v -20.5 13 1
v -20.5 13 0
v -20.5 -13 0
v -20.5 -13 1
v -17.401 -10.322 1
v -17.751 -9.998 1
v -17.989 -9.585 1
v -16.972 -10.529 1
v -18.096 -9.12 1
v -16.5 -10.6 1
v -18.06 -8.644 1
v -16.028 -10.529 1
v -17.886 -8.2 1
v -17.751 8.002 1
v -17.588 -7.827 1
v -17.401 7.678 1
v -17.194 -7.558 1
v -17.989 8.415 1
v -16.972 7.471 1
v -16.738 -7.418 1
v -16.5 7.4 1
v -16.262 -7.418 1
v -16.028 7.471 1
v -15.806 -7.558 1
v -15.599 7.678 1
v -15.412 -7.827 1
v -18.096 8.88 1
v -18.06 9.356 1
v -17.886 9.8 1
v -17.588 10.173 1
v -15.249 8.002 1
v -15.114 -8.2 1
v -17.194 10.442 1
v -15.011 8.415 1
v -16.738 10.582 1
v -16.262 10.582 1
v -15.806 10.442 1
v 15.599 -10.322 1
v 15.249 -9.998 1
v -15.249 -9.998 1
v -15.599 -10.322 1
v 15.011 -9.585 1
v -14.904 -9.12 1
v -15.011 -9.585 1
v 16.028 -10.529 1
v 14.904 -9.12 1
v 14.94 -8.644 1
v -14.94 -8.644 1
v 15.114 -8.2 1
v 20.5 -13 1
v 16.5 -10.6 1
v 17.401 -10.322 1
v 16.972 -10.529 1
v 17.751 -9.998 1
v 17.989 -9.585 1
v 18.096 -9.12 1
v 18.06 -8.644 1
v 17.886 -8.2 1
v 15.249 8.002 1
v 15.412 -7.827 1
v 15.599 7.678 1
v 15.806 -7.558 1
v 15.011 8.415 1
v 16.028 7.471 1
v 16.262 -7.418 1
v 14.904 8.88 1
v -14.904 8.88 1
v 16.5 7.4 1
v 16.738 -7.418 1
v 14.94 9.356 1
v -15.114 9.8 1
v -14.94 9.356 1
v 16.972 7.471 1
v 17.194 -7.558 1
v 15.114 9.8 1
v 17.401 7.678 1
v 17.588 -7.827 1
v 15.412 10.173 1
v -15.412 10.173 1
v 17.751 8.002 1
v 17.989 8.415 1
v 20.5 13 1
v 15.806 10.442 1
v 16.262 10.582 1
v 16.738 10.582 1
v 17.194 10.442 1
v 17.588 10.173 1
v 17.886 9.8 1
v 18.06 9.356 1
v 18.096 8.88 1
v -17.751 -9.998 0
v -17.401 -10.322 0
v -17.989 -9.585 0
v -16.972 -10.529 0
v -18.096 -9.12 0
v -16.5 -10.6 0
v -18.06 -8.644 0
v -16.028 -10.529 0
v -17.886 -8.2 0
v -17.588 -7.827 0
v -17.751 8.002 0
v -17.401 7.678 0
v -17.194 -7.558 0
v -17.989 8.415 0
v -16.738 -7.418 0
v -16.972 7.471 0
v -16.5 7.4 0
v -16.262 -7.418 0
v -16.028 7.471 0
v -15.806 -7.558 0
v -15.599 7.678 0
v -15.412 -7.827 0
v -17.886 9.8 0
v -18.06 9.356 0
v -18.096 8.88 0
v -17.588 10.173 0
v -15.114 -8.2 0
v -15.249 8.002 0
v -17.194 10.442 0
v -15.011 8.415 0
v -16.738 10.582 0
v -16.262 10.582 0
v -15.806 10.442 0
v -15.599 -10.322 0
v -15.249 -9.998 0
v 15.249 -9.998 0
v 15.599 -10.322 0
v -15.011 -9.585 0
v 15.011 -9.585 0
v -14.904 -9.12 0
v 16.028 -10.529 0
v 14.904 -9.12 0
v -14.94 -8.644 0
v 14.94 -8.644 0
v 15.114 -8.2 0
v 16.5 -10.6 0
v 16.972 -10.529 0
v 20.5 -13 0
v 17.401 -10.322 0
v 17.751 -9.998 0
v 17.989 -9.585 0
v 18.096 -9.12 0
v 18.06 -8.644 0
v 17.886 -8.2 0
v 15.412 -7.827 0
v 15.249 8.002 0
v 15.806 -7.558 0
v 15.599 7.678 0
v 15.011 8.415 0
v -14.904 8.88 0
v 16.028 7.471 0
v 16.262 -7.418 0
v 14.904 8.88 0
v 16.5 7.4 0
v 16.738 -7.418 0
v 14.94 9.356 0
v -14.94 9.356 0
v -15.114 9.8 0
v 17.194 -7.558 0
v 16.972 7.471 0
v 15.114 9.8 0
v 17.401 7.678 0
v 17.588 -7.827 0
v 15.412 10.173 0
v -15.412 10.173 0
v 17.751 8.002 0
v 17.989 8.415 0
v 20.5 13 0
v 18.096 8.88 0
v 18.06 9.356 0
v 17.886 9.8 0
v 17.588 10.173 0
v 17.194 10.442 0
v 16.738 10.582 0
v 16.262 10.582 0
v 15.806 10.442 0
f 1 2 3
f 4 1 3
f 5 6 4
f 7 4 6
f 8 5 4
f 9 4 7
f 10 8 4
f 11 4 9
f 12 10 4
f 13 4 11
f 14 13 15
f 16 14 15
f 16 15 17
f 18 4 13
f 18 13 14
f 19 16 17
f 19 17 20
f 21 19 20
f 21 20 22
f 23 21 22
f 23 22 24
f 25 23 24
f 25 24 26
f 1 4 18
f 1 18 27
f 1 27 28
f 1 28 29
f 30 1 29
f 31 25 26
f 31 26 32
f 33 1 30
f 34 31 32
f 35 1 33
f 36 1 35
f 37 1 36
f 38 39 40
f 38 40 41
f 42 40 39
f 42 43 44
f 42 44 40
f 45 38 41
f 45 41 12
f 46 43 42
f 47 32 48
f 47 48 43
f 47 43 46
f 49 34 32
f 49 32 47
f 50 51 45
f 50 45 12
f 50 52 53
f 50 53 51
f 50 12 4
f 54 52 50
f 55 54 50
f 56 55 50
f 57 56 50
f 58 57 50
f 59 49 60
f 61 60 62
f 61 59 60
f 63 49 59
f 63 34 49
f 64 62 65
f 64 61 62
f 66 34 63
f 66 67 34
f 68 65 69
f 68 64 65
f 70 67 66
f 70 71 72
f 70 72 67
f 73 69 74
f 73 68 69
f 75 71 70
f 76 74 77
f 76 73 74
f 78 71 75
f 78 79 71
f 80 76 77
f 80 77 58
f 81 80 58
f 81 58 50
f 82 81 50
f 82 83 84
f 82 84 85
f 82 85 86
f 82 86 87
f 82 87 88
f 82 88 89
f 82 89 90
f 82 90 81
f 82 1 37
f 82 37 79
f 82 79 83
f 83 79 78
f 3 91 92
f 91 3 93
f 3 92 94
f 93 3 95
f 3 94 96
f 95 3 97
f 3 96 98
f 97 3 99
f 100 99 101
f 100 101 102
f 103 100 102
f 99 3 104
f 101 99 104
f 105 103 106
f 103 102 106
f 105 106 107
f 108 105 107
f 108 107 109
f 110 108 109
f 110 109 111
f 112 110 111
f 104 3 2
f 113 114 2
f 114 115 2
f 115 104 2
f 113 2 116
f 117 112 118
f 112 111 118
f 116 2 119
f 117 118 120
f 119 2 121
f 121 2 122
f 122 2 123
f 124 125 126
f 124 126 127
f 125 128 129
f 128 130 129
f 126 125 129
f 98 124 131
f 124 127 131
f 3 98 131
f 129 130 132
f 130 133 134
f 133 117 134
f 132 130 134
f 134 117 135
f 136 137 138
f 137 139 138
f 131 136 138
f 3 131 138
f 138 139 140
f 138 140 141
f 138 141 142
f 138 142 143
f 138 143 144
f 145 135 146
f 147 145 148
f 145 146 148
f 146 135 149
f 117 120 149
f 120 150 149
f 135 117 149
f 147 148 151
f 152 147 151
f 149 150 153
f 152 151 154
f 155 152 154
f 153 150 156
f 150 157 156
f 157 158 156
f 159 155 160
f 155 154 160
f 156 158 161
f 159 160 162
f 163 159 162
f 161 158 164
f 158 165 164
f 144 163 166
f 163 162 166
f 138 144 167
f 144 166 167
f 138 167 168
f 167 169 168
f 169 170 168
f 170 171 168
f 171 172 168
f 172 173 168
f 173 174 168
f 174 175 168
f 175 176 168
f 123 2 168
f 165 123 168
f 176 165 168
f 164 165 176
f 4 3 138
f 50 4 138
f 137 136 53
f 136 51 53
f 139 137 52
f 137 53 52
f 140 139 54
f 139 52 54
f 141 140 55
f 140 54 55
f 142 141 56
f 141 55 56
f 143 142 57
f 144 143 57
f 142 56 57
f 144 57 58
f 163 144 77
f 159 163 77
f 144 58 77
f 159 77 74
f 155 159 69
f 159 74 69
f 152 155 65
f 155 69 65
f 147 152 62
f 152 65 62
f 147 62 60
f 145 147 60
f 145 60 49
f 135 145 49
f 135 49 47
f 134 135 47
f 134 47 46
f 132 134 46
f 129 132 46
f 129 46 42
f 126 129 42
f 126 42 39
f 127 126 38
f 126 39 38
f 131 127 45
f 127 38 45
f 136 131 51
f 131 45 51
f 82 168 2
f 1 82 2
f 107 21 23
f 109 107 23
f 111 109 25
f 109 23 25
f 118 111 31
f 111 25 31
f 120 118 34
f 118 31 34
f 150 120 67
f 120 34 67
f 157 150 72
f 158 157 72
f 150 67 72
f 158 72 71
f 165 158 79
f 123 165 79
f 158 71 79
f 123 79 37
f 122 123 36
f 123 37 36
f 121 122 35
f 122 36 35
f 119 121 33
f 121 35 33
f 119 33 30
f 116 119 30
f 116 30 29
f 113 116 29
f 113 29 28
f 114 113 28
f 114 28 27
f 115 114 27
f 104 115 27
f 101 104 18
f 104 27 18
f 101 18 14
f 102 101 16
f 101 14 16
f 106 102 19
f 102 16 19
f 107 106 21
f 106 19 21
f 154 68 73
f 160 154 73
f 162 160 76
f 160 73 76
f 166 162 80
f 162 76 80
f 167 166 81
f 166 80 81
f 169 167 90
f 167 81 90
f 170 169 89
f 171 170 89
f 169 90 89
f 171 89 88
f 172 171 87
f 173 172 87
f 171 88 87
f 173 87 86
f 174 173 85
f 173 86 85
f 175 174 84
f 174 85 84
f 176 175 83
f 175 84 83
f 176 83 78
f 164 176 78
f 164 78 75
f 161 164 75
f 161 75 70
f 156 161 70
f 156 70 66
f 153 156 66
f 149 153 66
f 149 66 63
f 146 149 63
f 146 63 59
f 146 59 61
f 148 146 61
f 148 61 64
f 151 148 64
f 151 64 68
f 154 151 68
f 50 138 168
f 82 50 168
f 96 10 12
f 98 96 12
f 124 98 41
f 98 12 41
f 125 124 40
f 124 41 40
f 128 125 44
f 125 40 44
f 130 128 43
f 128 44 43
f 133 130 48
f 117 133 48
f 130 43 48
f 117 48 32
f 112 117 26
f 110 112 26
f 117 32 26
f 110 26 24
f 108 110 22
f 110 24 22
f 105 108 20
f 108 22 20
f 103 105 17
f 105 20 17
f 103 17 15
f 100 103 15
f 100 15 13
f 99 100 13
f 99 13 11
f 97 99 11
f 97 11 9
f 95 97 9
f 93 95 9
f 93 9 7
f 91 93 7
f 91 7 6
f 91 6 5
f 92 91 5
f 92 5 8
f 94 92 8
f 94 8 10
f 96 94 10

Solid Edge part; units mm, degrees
sketch "Sketch1" plane through (0, 0, 0) normal (0, 0, 1) x (1, 0, 0)
  line L0 (-20.5, -13) -> (20.5, -13)
  line L1 (20.5, -13) -> (20.5, 13)
  line L2 (20.5, 13) -> (-20.5, 13)
  line L3 (-20.5, 13) -> (-20.5, -13)
  dimension "D1" = 41
  dimension "D2" = 26
extrude "Protrusion1" add sketch "Sketch1" along normal blind 1
hole "Hole_1" at (-16.5, 9, 1) direction (0, 0, -1) diameter 3.2 end up to next
hole "Hole1" at (16.5, 9, 1) direction (0, 0, -1) diameter 3.2 end up to next
hole "Hole2" at (16.5, -9, 1) direction (0, 0, -1) diameter 3.2 end up to next
hole "Hole3" at (-16.5, -9, 1) direction (0, 0, -1) diameter 3.2 end up to next
properties material "Polyethylene, low density"
